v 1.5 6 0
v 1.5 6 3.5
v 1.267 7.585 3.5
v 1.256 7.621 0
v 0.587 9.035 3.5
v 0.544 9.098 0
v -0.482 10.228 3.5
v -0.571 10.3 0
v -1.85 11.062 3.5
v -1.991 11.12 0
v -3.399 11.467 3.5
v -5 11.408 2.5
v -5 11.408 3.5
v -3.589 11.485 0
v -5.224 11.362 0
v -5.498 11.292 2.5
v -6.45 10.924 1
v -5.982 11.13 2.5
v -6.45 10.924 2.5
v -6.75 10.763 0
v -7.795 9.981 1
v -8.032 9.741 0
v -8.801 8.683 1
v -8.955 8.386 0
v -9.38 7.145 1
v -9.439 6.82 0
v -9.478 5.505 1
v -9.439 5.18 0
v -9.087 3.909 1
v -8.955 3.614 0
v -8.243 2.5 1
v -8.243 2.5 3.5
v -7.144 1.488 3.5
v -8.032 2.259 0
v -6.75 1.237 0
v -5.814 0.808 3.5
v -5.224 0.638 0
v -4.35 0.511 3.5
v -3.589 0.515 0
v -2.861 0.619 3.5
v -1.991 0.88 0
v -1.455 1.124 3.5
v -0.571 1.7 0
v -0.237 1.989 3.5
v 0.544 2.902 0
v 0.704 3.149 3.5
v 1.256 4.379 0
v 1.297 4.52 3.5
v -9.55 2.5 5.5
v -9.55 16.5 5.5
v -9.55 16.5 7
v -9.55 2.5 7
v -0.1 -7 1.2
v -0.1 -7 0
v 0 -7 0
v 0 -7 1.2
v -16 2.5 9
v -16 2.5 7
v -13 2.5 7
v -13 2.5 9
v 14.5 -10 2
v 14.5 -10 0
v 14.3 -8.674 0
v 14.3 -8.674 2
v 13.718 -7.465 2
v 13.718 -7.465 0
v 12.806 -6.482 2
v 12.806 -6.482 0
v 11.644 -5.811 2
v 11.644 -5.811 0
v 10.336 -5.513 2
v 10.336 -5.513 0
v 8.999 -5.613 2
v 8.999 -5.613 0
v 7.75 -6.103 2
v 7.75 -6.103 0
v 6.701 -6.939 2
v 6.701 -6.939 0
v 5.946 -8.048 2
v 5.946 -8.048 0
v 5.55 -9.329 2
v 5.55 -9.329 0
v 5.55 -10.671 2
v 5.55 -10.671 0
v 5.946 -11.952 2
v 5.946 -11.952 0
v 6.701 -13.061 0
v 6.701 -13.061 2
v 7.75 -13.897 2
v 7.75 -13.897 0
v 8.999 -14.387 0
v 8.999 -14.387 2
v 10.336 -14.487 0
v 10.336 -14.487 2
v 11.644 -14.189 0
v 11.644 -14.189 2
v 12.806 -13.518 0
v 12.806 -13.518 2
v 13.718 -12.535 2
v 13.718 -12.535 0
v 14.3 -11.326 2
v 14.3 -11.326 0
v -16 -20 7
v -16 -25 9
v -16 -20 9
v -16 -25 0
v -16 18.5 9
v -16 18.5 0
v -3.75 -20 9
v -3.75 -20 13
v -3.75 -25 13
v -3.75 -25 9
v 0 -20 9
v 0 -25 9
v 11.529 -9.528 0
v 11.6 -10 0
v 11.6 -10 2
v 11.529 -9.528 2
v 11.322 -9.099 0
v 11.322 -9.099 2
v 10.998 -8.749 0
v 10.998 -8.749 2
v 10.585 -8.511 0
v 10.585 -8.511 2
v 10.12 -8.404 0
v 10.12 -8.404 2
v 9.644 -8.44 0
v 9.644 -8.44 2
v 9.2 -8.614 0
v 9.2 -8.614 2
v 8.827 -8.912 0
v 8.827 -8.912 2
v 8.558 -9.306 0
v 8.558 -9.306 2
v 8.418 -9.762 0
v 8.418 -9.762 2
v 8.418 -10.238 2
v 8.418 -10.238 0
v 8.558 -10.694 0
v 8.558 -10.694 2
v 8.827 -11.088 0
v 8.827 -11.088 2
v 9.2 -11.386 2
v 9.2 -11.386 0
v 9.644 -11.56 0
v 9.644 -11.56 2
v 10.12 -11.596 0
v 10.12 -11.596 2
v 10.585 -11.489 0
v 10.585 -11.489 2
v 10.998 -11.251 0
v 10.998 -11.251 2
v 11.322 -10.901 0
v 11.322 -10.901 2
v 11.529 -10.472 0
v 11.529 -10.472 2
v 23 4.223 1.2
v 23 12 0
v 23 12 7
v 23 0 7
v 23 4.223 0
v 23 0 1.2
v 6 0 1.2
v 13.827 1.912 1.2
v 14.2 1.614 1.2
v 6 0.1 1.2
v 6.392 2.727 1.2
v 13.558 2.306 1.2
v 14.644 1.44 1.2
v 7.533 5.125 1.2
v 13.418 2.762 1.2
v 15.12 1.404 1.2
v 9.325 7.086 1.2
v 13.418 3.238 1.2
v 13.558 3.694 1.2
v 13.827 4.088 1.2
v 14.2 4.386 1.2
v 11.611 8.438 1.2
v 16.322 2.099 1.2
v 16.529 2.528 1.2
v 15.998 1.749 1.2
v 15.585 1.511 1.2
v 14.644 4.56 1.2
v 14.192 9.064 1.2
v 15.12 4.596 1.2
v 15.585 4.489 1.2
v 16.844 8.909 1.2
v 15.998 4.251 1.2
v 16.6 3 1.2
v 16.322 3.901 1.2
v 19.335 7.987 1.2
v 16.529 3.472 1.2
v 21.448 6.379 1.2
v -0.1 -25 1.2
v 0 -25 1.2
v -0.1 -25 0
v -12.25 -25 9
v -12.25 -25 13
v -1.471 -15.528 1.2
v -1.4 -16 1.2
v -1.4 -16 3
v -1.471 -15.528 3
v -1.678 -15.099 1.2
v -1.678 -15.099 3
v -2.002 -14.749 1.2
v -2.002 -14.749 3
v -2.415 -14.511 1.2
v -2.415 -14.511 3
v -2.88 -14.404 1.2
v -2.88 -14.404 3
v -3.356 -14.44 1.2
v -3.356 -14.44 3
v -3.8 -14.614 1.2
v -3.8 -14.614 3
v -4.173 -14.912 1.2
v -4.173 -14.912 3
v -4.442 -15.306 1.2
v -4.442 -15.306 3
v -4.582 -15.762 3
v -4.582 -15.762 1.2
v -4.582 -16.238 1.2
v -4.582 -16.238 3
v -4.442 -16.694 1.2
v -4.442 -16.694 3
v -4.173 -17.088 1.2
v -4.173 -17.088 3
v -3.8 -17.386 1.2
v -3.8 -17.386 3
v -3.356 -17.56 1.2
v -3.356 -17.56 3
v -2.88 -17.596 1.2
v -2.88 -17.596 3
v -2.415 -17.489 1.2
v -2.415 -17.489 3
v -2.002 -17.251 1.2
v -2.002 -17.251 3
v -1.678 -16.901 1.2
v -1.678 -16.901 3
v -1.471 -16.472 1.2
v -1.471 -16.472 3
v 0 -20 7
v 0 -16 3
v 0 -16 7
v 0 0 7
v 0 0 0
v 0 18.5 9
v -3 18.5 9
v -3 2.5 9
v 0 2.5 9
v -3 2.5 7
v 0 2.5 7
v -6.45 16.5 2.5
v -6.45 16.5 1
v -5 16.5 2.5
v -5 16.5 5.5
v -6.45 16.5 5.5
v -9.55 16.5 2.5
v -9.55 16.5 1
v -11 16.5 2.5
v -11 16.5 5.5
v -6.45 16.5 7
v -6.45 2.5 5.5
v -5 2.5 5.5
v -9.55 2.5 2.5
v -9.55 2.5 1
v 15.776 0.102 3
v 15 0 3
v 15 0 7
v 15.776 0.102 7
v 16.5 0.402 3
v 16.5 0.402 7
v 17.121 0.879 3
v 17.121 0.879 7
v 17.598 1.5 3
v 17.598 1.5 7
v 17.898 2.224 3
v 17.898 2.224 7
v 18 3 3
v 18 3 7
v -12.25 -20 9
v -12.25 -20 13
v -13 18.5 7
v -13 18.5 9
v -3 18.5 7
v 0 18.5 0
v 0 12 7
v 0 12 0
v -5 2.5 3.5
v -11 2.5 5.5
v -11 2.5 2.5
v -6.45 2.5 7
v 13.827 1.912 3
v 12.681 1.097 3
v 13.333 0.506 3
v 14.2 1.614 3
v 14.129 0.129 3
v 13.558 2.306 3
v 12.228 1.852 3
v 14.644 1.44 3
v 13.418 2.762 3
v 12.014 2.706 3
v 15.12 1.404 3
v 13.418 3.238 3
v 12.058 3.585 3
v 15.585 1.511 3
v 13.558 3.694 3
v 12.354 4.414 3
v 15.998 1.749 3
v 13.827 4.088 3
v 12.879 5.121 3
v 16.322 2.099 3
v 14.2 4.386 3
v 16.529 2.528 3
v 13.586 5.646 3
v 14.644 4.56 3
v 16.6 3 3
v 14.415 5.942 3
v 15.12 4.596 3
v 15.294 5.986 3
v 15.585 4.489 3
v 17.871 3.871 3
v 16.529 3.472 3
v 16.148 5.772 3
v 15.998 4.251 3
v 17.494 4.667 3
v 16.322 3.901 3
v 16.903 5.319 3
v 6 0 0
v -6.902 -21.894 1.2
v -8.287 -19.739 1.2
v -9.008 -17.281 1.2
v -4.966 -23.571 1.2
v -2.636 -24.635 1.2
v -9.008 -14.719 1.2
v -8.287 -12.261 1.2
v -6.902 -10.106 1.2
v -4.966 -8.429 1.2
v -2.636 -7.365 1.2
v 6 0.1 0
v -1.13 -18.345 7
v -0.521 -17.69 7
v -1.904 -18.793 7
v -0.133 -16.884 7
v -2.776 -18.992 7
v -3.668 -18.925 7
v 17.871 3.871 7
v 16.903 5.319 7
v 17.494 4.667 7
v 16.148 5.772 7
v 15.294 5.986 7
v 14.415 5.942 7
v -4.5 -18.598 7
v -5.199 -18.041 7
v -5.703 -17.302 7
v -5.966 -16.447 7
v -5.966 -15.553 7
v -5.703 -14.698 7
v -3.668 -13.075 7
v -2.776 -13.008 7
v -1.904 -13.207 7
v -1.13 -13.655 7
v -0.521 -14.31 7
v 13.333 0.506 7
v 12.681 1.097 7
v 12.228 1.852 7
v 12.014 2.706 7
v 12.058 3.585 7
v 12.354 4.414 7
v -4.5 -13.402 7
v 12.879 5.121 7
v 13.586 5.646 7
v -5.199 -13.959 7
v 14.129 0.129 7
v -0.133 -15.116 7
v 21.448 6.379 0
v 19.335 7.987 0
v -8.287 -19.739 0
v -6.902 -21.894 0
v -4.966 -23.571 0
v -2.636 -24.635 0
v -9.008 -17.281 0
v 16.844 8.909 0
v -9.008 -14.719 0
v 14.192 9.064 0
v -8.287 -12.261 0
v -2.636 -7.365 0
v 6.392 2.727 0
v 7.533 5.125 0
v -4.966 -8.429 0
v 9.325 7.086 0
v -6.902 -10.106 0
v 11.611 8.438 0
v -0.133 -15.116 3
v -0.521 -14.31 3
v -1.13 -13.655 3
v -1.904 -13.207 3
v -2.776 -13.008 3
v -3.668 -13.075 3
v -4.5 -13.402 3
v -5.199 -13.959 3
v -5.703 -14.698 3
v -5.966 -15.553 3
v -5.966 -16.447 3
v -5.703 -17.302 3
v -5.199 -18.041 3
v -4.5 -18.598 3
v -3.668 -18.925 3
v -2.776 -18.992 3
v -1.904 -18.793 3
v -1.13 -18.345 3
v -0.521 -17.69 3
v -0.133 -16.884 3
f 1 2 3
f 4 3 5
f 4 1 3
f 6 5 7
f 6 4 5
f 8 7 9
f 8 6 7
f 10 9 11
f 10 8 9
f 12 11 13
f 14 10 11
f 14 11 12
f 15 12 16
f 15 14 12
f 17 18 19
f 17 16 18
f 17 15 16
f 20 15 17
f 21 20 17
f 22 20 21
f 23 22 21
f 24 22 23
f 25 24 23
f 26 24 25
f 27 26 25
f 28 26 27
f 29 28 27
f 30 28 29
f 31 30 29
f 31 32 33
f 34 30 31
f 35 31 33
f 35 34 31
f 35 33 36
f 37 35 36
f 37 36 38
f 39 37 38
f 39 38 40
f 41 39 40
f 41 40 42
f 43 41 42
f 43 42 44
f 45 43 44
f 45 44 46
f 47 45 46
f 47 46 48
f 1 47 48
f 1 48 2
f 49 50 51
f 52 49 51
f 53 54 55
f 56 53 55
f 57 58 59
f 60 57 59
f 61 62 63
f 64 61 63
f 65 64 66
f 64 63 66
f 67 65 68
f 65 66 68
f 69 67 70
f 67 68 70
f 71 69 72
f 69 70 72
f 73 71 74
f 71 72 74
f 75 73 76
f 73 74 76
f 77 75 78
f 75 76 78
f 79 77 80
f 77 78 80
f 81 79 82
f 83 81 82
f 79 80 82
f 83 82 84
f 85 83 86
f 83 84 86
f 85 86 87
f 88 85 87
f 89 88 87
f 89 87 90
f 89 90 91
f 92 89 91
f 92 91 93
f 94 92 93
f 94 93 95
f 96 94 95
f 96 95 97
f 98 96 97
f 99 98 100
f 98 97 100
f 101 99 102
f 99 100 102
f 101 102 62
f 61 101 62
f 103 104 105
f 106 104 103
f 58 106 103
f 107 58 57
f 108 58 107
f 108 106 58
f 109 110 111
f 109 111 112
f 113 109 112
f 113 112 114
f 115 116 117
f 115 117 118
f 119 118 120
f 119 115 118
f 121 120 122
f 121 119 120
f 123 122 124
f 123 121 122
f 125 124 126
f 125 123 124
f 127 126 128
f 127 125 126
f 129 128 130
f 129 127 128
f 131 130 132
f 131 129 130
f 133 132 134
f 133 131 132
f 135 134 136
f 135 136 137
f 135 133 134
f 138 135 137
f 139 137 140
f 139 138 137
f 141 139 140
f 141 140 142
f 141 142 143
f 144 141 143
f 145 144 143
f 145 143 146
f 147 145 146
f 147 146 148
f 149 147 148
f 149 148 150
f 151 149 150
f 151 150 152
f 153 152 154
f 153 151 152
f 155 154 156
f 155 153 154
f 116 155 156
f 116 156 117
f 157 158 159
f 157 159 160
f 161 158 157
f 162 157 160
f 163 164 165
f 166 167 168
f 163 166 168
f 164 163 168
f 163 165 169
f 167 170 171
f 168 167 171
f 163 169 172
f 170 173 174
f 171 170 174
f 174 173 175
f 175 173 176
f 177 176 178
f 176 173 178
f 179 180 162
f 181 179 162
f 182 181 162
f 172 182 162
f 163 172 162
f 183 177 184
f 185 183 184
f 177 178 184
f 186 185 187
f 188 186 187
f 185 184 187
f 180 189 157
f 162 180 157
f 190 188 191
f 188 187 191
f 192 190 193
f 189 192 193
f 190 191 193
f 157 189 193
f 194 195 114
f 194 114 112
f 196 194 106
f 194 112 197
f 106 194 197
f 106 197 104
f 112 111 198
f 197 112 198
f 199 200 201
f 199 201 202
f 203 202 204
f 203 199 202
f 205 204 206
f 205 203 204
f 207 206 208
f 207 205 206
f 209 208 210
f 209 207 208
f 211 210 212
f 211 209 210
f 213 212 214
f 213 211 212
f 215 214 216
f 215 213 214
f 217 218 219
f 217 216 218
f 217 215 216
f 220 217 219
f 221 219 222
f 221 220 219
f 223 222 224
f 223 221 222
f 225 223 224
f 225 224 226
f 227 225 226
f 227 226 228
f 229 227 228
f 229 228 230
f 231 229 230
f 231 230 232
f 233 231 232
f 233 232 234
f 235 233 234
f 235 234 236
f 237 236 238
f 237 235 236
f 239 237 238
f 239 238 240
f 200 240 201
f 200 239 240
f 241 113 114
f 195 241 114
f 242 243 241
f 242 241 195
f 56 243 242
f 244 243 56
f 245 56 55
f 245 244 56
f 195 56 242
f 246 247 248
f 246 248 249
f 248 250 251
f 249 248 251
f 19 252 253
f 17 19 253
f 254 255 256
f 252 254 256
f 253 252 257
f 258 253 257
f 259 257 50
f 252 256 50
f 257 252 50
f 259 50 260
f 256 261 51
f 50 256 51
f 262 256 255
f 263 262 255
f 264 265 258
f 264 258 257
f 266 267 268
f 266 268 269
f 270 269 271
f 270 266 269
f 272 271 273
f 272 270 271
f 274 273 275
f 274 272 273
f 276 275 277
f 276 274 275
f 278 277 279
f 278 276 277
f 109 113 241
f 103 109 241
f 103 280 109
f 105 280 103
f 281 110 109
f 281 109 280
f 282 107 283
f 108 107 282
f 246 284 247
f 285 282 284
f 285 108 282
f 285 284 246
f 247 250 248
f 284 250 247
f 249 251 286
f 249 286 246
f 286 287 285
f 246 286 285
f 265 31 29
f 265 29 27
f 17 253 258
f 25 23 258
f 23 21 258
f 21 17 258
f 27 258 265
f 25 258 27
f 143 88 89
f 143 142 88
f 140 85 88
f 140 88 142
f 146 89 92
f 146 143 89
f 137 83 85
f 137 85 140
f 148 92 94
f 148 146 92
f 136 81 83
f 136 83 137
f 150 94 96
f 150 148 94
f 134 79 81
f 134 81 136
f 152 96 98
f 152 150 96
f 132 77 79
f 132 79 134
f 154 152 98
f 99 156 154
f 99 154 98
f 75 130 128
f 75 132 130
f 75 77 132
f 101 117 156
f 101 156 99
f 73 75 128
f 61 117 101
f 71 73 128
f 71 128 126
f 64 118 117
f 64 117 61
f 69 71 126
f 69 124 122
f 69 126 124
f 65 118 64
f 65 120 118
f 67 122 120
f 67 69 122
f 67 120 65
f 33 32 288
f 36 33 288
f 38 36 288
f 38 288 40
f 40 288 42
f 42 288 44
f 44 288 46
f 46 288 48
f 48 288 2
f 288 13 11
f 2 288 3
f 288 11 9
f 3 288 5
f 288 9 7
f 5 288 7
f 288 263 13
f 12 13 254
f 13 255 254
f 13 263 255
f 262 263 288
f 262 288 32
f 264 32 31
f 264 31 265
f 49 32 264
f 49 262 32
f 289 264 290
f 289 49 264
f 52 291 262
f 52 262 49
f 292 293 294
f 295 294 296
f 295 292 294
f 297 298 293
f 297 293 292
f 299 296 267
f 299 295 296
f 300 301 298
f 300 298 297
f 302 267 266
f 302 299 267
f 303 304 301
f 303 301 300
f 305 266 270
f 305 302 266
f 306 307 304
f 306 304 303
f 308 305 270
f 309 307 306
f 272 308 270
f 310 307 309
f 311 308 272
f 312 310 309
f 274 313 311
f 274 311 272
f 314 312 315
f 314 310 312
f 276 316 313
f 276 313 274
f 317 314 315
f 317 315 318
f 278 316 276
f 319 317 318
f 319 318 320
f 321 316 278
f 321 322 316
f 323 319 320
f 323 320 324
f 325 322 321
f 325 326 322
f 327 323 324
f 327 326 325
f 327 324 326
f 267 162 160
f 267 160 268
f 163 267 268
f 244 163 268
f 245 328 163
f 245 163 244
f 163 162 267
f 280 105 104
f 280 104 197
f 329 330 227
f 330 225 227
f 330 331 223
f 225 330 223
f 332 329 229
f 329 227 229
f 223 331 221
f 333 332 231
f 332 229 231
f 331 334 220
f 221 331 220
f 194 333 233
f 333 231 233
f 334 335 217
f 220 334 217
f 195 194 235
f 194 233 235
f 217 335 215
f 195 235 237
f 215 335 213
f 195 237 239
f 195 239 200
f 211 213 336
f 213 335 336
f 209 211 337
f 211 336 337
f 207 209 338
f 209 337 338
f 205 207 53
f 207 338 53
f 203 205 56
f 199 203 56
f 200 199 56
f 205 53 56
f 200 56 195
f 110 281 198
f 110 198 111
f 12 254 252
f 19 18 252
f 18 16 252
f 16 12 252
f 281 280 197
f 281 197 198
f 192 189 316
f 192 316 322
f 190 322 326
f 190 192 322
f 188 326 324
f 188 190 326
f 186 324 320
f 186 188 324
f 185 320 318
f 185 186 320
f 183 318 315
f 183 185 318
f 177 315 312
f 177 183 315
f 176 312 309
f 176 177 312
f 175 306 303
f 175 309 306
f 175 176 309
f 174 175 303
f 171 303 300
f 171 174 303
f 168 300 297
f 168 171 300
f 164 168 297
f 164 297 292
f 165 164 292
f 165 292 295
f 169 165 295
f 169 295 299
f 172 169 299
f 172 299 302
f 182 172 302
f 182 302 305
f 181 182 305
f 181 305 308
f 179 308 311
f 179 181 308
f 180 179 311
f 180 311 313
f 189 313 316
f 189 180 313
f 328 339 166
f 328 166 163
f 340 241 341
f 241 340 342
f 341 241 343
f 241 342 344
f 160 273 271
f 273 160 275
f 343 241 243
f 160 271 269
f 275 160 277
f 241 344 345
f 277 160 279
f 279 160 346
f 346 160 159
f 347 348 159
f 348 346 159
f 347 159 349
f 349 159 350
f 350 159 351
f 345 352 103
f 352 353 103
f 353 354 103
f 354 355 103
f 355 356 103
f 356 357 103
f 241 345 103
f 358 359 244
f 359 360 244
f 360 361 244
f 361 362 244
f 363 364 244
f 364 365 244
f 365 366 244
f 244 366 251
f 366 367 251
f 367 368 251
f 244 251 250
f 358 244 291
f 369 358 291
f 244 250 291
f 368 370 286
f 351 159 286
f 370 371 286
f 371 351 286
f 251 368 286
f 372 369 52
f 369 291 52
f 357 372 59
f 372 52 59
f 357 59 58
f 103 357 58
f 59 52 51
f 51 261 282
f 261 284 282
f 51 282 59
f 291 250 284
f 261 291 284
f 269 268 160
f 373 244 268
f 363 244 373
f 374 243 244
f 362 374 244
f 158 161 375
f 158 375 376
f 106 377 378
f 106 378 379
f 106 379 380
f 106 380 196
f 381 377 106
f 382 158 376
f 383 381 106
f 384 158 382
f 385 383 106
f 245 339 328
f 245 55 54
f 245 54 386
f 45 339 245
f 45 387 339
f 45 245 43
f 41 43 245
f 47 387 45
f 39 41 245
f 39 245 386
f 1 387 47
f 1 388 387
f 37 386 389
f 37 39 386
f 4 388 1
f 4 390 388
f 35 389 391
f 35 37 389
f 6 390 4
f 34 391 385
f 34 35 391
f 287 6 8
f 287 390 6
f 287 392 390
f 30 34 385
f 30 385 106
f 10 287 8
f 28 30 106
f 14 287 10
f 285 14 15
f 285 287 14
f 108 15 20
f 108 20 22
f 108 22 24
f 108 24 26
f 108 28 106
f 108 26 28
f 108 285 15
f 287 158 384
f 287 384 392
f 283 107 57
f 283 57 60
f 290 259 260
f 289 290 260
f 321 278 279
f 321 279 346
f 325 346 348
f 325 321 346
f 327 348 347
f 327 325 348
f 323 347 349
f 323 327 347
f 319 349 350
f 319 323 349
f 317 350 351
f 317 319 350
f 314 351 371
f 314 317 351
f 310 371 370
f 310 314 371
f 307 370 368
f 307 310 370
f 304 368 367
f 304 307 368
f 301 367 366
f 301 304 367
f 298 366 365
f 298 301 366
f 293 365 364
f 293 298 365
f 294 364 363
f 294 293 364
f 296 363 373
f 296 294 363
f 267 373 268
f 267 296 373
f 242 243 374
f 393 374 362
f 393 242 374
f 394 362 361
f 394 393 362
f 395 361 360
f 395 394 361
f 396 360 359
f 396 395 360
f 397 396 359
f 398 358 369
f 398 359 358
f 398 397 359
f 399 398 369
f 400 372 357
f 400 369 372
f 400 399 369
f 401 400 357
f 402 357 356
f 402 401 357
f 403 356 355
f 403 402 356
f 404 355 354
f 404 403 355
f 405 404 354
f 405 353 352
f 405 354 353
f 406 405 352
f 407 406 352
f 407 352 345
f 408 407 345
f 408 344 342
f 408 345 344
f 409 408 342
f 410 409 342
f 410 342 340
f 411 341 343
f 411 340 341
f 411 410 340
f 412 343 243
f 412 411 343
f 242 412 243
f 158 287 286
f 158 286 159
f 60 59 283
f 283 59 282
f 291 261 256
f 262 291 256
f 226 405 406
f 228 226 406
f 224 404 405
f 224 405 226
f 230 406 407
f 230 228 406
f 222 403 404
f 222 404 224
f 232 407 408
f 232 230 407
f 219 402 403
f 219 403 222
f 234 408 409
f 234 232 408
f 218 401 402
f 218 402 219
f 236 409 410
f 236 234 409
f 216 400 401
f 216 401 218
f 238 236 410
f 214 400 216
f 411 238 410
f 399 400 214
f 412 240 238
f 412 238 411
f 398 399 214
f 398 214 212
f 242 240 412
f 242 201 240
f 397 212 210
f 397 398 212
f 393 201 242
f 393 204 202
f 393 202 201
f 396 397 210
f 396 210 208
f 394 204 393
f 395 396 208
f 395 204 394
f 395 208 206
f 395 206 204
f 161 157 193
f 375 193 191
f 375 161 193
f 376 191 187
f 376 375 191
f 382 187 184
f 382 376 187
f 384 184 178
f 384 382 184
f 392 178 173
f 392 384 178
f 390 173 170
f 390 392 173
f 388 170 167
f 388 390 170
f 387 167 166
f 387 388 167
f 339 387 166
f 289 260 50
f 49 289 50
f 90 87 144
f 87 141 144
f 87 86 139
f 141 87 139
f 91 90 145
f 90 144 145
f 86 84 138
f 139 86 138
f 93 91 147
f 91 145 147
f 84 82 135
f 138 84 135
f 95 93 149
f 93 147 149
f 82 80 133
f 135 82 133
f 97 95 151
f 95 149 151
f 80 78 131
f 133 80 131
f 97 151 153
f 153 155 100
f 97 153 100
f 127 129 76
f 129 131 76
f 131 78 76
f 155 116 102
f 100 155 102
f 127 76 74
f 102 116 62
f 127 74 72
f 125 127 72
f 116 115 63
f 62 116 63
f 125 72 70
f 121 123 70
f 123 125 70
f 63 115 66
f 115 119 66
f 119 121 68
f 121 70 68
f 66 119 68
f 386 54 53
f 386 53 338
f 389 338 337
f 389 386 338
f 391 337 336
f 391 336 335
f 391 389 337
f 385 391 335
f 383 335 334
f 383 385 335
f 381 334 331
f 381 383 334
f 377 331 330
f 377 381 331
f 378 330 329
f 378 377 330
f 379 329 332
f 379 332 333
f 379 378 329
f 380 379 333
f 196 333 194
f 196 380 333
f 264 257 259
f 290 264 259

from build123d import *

# Parameters (mm, degrees)
SKETCH002_R                          = 1.6
EXTRUDE002_DEPTH                     = 8
SKETCH003_R                          = 5.5
EXTRUDE003_DEPTH                     = 3.5
EXTRUDE006_DEPTH                     = 14
EXTRUDE006_ONTO_SKETCH006_ROLL_ANGLE = 90
SKETCH007_R                          = 3
EXTRUDE007_DEPTH                     = 10
EXTRUDE001_DEPTH                     = 1.2
EXTRUDE005_DEPTH                     = 5
EXTRUDE005_ONTO_SKETCH005_ROLL_ANGLE = 90
SKETCH004_W                          = 3
SKETCH004_H                          = 16
EXTRUDE008_DEPTH                     = 2
EXTRUDE_DEPTH                        = 7
SKETCH008_R                          = 4.5
SKETCH008_R_2                        = 1.6
EXTRUDE009_DEPTH                     = 2


with BuildPart() as extrude002:
    # Sketch002 → Extrude002 (new body)
    with BuildSketch(Plane.XY):
        with Locations((15, 3)):
            Circle(SKETCH002_R)
        with Locations((-3, -16)):
            Circle(SKETCH002_R)
    extrude(amount=EXTRUDE002_DEPTH)


with BuildPart() as extrude003:
    # Sketch003 → Extrude003 (new body)
    with BuildSketch(Plane.XY):
        with Locations((-4, 6)):
            Circle(SKETCH003_R)
    extrude(amount=EXTRUDE003_DEPTH)


with BuildPart() as extrude007:
    # Sketch006 as drawn → Extrude006 (new)
    with BuildSketch(Plane.XY):
        Polygon((-9.55, -1), (-9.55, 9), (-6.45, 9), (-6.45, -1), (-5, -1), (-5, -4), (-6.45, -4), (-6.45, -5.5), (-9.55, -5.5), (-9.55, -4), (-11, -4), (-11, -1), align=None)
    extrude(amount=EXTRUDE006_DEPTH)


with BuildPart() as extrude007_1:
    # Extrude006 onto Sketch006 roll: moved
    add(extrude007.part.rotate(Axis((0, 0, 0), (1, 0, 0)), EXTRUDE006_ONTO_SKETCH006_ROLL_ANGLE))


with BuildPart() as extrude007_2:
    # Extrude006 onto Sketch006 placement: moved
    add(extrude007_1.part)


with BuildPart() as extrude007_3:
    # Extrude006 placement: moved
    add(extrude007_2.part.moved(Location((0, 16.5, 6.5))))


with BuildPart() as extrude008:
    # Sketch007 → Extrude007 (new body)
    with BuildSketch(Plane.XY):
        with Locations((15, 3)):
            Circle(SKETCH007_R)
        with Locations((-3, -16)):
            Circle(SKETCH007_R)
    extrude(amount=EXTRUDE007_DEPTH)


with BuildPart() as extrude008_1:
    # Extrude007 placement: moved
    add(extrude008.part.moved(Location((0, 0, 3))))


with BuildPart() as fusion:
    # Sketch001 → Extrude001 (new body)
    with BuildSketch(Plane.XY):
        with BuildLine():
            ThreePointArc((24, 0.1), (15, 9.1), (6, 0.1))
            Line((6, 0.1), (6, 0))
            Line((6, 0), (24, 0))
            Line((24, 0.1), (24, 0))
        make_face()
        with BuildLine():
            ThreePointArc((-0.1, -7), (-9.1, -16), (-0.1, -25))
            Line((-0.1, -25), (0, -25))
            Line((0, -25), (0, -7))
            Line((-0.1, -7), (0, -7))
        make_face()
    extrude(amount=EXTRUDE001_DEPTH)

    # Fusion: union Extrude002, Extrude003, Extrude007, Extrude008
    add(extrude002.part)
    add(extrude003.part)
    add(extrude007_3.part)
    add(extrude008_1.part)


with BuildPart() as extrude006:
    # Sketch005 as drawn → Extrude005 (new)
    with BuildSketch(Plane.XY):
        Polygon((-16, 0), (-16, 2), (-12.25, 2), (-12.25, 6), (-3.75, 6), (-3.75, 2), (0, 2), (0, 0), align=None)
    extrude(amount=EXTRUDE005_DEPTH)


with BuildPart() as extrude006_1:
    # Extrude005 onto Sketch005 roll: moved
    add(extrude006.part.rotate(Axis((0, 0, 0), (1, 0, 0)), EXTRUDE005_ONTO_SKETCH005_ROLL_ANGLE))


with BuildPart() as extrude006_2:
    # Extrude005 onto Sketch005 placement: moved
    add(extrude006_1.part)


with BuildPart() as extrude006_3:
    # Extrude005 placement: moved
    add(extrude006_2.part.moved(Location((0, -20, 7))))


with BuildPart() as extrude009:
    # Sketch004 → Extrude008 (new body)
    with BuildSketch(Plane.XY):
        with Locations((-14.5, 10.5)):
            Rectangle(SKETCH004_W, SKETCH004_H)
        with Locations((-1.5, 10.5)):
            Rectangle(SKETCH004_W, SKETCH004_H)
    extrude(amount=EXTRUDE008_DEPTH)


with BuildPart() as extrude009_1:
    # Extrude008 placement: moved
    add(extrude009.part.moved(Location((0, 0, 7))))


with BuildPart() as cut:
    # Sketch → Extrude (new body)
    with BuildSketch(Plane.XY):
        Polygon((-16, 18.5), (0, 18.5), (0, 12), (23, 12), (23, 0), (0, 0), (0, -25), (-16, -25), align=None)
    extrude(amount=EXTRUDE_DEPTH)

    # Fusion001: union Extrude006, Extrude009
    add(extrude006_3.part)
    add(extrude009_1.part)

    # Cut: cut Fusion
    add(fusion.part, mode=Mode.SUBTRACT)


with BuildPart() as entretoise:
    # Sketch008 → Extrude009 (new body)
    with BuildSketch(Plane.XY):
        with Locations((10, -10)):
            Circle(SKETCH008_R)
        with Locations((10, -10)):
            Circle(SKETCH008_R_2, mode=Mode.SUBTRACT)
    extrude(amount=EXTRUDE009_DEPTH)


solid = Compound([cut.part, entretoise.part])
